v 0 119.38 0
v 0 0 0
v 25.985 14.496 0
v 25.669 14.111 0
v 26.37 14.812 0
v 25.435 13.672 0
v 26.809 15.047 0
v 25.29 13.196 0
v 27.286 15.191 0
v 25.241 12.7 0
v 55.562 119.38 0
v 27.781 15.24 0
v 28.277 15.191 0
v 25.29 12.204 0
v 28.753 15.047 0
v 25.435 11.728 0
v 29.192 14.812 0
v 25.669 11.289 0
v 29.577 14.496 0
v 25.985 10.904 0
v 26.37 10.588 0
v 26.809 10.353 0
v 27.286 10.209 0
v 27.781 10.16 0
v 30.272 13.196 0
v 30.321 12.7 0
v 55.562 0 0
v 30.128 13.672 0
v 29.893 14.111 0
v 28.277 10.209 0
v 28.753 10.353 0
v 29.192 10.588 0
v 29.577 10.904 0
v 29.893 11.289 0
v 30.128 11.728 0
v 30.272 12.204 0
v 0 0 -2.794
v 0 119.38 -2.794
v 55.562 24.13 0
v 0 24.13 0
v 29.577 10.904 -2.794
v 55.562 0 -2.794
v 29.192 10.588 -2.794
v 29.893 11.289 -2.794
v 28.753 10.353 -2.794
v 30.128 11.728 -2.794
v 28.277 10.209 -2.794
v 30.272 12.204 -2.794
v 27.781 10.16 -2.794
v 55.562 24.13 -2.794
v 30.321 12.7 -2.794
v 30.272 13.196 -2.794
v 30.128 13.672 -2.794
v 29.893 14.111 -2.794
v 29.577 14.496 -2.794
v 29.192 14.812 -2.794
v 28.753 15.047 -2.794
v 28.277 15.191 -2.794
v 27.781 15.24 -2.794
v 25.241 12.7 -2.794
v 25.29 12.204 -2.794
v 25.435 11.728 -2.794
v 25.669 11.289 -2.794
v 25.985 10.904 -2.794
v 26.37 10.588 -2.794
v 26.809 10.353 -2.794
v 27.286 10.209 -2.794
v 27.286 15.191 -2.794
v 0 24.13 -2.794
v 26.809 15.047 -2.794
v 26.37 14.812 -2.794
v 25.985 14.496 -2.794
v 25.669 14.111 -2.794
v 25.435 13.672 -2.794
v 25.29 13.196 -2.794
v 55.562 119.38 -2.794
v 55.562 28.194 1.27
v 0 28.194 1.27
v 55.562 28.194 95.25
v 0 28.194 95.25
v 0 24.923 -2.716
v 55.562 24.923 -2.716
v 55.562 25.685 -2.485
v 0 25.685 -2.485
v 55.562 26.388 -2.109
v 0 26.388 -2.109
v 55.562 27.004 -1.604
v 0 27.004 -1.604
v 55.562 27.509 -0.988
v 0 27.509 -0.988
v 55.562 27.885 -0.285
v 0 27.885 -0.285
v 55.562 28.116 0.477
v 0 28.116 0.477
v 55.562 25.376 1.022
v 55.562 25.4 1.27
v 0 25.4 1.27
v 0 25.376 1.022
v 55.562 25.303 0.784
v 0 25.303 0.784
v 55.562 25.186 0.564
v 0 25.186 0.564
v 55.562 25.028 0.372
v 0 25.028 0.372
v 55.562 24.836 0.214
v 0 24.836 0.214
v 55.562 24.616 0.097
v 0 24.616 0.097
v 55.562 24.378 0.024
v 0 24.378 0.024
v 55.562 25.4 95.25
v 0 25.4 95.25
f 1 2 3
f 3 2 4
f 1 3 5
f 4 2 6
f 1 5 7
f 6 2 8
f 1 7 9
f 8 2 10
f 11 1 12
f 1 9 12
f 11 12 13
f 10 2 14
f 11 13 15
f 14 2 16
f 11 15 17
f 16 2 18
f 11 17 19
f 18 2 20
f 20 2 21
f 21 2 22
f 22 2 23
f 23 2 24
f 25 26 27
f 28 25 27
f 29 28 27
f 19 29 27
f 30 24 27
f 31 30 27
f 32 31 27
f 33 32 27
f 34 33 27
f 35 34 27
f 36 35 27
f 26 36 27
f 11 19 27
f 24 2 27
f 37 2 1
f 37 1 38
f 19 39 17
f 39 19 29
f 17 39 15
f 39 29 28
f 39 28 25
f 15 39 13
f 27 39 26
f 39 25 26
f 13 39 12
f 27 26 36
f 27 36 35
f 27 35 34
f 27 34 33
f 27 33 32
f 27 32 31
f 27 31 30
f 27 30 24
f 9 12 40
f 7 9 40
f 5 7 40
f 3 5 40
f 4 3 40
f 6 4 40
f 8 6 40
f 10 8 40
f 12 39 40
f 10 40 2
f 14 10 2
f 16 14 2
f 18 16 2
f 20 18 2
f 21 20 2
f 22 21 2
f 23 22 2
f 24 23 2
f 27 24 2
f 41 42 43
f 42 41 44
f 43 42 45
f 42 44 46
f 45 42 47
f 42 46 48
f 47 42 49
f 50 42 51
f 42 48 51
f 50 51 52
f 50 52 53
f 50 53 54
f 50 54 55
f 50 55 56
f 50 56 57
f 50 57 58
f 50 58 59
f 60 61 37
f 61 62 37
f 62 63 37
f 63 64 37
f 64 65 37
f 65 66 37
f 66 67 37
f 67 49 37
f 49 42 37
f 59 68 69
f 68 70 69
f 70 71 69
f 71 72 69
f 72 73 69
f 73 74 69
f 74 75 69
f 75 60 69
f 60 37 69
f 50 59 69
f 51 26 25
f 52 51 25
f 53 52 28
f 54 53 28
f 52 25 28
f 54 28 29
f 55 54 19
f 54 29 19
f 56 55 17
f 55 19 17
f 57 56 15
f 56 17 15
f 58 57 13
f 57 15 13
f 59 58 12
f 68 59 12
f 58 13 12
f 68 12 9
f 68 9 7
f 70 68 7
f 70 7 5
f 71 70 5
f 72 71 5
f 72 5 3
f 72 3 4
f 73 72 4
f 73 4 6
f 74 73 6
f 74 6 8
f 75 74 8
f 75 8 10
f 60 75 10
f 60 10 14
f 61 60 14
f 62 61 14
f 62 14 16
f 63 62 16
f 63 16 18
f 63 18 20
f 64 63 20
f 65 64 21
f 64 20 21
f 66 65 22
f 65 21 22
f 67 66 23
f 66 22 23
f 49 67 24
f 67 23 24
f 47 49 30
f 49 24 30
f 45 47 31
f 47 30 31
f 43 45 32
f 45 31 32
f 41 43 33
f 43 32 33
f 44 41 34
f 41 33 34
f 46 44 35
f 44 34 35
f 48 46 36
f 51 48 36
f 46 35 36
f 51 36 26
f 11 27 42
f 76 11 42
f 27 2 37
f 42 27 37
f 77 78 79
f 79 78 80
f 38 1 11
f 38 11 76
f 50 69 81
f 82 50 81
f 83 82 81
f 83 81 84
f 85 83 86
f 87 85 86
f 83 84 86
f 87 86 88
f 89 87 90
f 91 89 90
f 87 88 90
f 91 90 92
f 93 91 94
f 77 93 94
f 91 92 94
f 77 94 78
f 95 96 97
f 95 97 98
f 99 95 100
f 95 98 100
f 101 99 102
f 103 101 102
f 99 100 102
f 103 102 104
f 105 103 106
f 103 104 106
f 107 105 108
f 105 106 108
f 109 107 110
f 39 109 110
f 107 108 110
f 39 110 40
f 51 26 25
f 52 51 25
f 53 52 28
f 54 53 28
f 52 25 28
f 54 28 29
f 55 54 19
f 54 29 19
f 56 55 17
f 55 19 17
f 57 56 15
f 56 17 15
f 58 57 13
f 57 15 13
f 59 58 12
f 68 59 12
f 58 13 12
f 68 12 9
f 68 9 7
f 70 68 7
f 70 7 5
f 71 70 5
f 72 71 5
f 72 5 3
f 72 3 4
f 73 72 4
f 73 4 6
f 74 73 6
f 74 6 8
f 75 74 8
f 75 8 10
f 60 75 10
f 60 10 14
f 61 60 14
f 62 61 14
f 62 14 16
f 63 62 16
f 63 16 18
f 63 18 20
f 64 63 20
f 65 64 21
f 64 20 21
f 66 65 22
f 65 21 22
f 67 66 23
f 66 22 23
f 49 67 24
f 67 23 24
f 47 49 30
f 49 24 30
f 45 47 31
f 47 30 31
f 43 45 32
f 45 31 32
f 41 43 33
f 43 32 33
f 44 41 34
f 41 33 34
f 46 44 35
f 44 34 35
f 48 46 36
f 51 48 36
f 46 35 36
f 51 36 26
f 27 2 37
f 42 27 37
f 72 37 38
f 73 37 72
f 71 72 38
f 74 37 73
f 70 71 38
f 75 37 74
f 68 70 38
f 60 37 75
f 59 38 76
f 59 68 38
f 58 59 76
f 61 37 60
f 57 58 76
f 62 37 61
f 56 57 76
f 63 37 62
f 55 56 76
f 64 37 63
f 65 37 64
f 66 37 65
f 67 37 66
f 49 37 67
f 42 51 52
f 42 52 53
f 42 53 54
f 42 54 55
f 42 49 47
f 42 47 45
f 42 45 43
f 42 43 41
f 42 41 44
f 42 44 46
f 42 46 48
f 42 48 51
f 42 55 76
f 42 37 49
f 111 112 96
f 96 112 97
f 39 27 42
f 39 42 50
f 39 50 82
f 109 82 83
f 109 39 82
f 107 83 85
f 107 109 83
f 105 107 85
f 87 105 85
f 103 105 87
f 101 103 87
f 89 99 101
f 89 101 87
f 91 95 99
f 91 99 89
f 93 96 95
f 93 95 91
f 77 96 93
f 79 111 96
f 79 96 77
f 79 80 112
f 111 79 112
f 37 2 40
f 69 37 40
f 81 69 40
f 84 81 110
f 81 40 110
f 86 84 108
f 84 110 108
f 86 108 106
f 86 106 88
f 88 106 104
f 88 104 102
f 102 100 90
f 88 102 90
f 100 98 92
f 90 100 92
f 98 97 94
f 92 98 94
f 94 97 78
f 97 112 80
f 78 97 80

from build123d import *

# Parameters (mm, degrees)
F1_DEPTH = 55.5625
F2_R     = 2.54
F3_DEPTH = 25.4
F4_DEPTH = 119.38
F5_R     = 2.54
F6_DEPTH = 25.4


with BuildPart() as f1:
    # F0 (on Right) → F1 (new body)
    with BuildSketch(Plane.YZ):
        with BuildLine():
            Line((24.13, 0), (0, 0))
            Line((0, 0), (0, -2.794))
            Line((0, -2.794), (24.13, -2.794))
            ThreePointArc((24.13, -2.794), (27.0036819587, -1.6036819587), (28.194, 1.27))
            Line((28.194, 1.27), (28.194, 95.25))
            Line((28.194, 95.25), (25.4, 95.25))
            Line((25.4, 95.25), (25.4, 1.27))
            ThreePointArc((25.4, 1.27), (25.0280256121, 0.3719743879), (24.13, 0))
        make_face()
    extrude(amount=F1_DEPTH)

    # F2 (on face) → F3 (cut)
    with BuildSketch(Plane.XY):
        with Locations((27.78125, 12.7)):
            Circle(F2_R)
    extrude(amount=-F3_DEPTH, mode=Mode.SUBTRACT)


with BuildPart() as f4:
    # F4 (new): a face of the model
    f4_faces = [f1.part.faces().sort_by_distance(p)[0] for p in [
        (27.78125, 0, -1.397),
    ]]
    extrude(f4_faces, amount=-F4_DEPTH)

    # F5 (on face) → F6 (cut)
    with BuildSketch(Plane.XY):
        with Locations((27.78125, 12.7)):
            Circle(F5_R)
    extrude(amount=-F6_DEPTH, mode=Mode.SUBTRACT)


solid = Compound([f1.part, f4.part])
